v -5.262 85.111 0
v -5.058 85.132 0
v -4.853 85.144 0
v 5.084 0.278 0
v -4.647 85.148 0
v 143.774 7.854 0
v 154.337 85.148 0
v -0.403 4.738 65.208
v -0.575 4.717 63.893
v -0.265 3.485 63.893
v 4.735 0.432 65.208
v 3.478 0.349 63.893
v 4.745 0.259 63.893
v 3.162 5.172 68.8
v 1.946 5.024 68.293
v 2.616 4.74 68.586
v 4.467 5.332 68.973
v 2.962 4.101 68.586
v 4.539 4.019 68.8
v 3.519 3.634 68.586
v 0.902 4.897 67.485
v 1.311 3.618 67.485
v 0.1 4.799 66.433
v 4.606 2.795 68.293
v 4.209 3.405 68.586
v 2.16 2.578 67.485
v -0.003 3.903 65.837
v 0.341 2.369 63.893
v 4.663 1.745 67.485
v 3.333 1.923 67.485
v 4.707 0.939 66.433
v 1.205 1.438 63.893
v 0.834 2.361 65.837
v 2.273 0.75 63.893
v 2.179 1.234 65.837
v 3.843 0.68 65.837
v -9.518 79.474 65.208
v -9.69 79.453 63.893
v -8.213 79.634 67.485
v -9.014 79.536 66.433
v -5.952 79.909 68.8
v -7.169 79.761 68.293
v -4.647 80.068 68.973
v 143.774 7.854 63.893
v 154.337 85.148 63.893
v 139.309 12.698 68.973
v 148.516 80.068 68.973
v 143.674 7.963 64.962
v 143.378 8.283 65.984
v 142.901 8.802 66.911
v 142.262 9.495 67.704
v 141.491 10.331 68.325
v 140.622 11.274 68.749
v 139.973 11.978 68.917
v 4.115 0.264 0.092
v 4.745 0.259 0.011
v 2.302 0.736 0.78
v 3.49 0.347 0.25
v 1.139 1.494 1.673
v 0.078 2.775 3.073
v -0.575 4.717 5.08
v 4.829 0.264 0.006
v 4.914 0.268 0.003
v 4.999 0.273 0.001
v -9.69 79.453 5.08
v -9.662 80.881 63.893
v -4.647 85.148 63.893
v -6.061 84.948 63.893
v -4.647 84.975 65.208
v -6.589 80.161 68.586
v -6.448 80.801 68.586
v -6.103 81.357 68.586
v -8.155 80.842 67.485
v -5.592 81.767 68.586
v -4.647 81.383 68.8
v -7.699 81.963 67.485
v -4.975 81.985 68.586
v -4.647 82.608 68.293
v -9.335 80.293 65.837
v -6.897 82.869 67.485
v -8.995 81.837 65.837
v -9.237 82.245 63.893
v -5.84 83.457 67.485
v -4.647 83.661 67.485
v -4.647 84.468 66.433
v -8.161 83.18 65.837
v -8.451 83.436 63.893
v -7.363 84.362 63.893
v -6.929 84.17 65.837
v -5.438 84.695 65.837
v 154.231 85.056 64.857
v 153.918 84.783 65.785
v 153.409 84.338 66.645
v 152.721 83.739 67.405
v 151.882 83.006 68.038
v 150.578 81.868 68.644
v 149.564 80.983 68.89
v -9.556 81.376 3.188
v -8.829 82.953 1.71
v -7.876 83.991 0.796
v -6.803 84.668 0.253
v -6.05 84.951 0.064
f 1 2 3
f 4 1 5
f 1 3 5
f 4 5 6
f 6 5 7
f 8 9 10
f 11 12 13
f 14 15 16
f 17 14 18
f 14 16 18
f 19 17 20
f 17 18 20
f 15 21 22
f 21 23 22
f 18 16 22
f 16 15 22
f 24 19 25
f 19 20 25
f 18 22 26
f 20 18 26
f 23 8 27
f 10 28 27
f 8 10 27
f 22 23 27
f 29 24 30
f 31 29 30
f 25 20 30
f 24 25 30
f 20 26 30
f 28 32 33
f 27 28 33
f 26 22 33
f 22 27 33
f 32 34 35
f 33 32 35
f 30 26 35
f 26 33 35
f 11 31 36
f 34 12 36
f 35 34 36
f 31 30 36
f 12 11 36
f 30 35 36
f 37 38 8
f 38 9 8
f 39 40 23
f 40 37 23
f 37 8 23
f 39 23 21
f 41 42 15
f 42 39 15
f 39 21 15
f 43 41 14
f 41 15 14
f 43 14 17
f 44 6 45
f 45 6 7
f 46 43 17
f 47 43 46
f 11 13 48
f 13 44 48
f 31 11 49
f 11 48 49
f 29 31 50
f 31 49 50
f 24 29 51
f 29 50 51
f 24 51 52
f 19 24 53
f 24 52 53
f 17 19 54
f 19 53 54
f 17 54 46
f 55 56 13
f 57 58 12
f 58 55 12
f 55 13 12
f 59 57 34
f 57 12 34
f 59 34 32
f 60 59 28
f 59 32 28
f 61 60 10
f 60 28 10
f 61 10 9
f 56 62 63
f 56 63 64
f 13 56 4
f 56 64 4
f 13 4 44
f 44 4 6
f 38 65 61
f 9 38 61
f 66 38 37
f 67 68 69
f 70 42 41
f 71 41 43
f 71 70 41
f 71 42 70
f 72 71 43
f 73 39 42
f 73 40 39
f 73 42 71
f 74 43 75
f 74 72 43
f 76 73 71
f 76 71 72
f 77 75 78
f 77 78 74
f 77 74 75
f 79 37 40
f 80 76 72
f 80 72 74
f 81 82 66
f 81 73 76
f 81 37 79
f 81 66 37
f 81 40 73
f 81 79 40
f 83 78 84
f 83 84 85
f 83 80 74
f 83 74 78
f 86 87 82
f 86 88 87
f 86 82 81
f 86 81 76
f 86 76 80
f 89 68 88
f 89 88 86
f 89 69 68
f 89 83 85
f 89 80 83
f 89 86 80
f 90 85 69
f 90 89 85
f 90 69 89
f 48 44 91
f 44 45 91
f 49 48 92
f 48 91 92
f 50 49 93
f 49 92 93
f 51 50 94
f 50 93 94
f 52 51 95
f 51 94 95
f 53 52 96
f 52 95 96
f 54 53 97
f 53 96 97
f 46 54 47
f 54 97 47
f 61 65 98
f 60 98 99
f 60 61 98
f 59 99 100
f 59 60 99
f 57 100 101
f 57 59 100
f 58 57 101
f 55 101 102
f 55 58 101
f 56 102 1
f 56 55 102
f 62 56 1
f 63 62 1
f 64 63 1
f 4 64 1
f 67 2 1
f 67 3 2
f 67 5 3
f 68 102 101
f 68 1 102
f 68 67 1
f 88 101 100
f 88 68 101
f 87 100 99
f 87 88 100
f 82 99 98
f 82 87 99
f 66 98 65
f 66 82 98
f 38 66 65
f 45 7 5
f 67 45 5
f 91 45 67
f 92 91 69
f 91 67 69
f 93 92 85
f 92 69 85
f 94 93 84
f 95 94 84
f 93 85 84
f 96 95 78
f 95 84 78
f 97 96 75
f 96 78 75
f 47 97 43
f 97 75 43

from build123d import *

# Parameters (mm, degrees)
F1_DEPTH = 68.97317
F2_R     = 5.08


with BuildPart() as f1:
    # F0 (on Top) → F1 (new body)
    with BuildSketch(Plane.XY):
        Polygon((0, 0), (143.774033, 7.85425), (154.337034, 85.148476), (-10.384366, 85.148476), align=None)
    extrude(amount=F1_DEPTH)

    # F2
    f2_edges = [f1.edges().sort_by_distance(p)[0] for p in [
        (-10.384366, 85.148476, 34.486585),
        (0, 0, 34.486585),
        (-5.192183, 42.574238, 0),
        (-5.192183, 42.574238, 68.97317),
        (71.976334, 85.148476, 68.97317),
        (71.887016, 3.927125, 68.97317),
        (149.055533, 46.501363, 68.97317),
    ]]
    fillet(f2_edges, radius=F2_R)


solid = f1.part
